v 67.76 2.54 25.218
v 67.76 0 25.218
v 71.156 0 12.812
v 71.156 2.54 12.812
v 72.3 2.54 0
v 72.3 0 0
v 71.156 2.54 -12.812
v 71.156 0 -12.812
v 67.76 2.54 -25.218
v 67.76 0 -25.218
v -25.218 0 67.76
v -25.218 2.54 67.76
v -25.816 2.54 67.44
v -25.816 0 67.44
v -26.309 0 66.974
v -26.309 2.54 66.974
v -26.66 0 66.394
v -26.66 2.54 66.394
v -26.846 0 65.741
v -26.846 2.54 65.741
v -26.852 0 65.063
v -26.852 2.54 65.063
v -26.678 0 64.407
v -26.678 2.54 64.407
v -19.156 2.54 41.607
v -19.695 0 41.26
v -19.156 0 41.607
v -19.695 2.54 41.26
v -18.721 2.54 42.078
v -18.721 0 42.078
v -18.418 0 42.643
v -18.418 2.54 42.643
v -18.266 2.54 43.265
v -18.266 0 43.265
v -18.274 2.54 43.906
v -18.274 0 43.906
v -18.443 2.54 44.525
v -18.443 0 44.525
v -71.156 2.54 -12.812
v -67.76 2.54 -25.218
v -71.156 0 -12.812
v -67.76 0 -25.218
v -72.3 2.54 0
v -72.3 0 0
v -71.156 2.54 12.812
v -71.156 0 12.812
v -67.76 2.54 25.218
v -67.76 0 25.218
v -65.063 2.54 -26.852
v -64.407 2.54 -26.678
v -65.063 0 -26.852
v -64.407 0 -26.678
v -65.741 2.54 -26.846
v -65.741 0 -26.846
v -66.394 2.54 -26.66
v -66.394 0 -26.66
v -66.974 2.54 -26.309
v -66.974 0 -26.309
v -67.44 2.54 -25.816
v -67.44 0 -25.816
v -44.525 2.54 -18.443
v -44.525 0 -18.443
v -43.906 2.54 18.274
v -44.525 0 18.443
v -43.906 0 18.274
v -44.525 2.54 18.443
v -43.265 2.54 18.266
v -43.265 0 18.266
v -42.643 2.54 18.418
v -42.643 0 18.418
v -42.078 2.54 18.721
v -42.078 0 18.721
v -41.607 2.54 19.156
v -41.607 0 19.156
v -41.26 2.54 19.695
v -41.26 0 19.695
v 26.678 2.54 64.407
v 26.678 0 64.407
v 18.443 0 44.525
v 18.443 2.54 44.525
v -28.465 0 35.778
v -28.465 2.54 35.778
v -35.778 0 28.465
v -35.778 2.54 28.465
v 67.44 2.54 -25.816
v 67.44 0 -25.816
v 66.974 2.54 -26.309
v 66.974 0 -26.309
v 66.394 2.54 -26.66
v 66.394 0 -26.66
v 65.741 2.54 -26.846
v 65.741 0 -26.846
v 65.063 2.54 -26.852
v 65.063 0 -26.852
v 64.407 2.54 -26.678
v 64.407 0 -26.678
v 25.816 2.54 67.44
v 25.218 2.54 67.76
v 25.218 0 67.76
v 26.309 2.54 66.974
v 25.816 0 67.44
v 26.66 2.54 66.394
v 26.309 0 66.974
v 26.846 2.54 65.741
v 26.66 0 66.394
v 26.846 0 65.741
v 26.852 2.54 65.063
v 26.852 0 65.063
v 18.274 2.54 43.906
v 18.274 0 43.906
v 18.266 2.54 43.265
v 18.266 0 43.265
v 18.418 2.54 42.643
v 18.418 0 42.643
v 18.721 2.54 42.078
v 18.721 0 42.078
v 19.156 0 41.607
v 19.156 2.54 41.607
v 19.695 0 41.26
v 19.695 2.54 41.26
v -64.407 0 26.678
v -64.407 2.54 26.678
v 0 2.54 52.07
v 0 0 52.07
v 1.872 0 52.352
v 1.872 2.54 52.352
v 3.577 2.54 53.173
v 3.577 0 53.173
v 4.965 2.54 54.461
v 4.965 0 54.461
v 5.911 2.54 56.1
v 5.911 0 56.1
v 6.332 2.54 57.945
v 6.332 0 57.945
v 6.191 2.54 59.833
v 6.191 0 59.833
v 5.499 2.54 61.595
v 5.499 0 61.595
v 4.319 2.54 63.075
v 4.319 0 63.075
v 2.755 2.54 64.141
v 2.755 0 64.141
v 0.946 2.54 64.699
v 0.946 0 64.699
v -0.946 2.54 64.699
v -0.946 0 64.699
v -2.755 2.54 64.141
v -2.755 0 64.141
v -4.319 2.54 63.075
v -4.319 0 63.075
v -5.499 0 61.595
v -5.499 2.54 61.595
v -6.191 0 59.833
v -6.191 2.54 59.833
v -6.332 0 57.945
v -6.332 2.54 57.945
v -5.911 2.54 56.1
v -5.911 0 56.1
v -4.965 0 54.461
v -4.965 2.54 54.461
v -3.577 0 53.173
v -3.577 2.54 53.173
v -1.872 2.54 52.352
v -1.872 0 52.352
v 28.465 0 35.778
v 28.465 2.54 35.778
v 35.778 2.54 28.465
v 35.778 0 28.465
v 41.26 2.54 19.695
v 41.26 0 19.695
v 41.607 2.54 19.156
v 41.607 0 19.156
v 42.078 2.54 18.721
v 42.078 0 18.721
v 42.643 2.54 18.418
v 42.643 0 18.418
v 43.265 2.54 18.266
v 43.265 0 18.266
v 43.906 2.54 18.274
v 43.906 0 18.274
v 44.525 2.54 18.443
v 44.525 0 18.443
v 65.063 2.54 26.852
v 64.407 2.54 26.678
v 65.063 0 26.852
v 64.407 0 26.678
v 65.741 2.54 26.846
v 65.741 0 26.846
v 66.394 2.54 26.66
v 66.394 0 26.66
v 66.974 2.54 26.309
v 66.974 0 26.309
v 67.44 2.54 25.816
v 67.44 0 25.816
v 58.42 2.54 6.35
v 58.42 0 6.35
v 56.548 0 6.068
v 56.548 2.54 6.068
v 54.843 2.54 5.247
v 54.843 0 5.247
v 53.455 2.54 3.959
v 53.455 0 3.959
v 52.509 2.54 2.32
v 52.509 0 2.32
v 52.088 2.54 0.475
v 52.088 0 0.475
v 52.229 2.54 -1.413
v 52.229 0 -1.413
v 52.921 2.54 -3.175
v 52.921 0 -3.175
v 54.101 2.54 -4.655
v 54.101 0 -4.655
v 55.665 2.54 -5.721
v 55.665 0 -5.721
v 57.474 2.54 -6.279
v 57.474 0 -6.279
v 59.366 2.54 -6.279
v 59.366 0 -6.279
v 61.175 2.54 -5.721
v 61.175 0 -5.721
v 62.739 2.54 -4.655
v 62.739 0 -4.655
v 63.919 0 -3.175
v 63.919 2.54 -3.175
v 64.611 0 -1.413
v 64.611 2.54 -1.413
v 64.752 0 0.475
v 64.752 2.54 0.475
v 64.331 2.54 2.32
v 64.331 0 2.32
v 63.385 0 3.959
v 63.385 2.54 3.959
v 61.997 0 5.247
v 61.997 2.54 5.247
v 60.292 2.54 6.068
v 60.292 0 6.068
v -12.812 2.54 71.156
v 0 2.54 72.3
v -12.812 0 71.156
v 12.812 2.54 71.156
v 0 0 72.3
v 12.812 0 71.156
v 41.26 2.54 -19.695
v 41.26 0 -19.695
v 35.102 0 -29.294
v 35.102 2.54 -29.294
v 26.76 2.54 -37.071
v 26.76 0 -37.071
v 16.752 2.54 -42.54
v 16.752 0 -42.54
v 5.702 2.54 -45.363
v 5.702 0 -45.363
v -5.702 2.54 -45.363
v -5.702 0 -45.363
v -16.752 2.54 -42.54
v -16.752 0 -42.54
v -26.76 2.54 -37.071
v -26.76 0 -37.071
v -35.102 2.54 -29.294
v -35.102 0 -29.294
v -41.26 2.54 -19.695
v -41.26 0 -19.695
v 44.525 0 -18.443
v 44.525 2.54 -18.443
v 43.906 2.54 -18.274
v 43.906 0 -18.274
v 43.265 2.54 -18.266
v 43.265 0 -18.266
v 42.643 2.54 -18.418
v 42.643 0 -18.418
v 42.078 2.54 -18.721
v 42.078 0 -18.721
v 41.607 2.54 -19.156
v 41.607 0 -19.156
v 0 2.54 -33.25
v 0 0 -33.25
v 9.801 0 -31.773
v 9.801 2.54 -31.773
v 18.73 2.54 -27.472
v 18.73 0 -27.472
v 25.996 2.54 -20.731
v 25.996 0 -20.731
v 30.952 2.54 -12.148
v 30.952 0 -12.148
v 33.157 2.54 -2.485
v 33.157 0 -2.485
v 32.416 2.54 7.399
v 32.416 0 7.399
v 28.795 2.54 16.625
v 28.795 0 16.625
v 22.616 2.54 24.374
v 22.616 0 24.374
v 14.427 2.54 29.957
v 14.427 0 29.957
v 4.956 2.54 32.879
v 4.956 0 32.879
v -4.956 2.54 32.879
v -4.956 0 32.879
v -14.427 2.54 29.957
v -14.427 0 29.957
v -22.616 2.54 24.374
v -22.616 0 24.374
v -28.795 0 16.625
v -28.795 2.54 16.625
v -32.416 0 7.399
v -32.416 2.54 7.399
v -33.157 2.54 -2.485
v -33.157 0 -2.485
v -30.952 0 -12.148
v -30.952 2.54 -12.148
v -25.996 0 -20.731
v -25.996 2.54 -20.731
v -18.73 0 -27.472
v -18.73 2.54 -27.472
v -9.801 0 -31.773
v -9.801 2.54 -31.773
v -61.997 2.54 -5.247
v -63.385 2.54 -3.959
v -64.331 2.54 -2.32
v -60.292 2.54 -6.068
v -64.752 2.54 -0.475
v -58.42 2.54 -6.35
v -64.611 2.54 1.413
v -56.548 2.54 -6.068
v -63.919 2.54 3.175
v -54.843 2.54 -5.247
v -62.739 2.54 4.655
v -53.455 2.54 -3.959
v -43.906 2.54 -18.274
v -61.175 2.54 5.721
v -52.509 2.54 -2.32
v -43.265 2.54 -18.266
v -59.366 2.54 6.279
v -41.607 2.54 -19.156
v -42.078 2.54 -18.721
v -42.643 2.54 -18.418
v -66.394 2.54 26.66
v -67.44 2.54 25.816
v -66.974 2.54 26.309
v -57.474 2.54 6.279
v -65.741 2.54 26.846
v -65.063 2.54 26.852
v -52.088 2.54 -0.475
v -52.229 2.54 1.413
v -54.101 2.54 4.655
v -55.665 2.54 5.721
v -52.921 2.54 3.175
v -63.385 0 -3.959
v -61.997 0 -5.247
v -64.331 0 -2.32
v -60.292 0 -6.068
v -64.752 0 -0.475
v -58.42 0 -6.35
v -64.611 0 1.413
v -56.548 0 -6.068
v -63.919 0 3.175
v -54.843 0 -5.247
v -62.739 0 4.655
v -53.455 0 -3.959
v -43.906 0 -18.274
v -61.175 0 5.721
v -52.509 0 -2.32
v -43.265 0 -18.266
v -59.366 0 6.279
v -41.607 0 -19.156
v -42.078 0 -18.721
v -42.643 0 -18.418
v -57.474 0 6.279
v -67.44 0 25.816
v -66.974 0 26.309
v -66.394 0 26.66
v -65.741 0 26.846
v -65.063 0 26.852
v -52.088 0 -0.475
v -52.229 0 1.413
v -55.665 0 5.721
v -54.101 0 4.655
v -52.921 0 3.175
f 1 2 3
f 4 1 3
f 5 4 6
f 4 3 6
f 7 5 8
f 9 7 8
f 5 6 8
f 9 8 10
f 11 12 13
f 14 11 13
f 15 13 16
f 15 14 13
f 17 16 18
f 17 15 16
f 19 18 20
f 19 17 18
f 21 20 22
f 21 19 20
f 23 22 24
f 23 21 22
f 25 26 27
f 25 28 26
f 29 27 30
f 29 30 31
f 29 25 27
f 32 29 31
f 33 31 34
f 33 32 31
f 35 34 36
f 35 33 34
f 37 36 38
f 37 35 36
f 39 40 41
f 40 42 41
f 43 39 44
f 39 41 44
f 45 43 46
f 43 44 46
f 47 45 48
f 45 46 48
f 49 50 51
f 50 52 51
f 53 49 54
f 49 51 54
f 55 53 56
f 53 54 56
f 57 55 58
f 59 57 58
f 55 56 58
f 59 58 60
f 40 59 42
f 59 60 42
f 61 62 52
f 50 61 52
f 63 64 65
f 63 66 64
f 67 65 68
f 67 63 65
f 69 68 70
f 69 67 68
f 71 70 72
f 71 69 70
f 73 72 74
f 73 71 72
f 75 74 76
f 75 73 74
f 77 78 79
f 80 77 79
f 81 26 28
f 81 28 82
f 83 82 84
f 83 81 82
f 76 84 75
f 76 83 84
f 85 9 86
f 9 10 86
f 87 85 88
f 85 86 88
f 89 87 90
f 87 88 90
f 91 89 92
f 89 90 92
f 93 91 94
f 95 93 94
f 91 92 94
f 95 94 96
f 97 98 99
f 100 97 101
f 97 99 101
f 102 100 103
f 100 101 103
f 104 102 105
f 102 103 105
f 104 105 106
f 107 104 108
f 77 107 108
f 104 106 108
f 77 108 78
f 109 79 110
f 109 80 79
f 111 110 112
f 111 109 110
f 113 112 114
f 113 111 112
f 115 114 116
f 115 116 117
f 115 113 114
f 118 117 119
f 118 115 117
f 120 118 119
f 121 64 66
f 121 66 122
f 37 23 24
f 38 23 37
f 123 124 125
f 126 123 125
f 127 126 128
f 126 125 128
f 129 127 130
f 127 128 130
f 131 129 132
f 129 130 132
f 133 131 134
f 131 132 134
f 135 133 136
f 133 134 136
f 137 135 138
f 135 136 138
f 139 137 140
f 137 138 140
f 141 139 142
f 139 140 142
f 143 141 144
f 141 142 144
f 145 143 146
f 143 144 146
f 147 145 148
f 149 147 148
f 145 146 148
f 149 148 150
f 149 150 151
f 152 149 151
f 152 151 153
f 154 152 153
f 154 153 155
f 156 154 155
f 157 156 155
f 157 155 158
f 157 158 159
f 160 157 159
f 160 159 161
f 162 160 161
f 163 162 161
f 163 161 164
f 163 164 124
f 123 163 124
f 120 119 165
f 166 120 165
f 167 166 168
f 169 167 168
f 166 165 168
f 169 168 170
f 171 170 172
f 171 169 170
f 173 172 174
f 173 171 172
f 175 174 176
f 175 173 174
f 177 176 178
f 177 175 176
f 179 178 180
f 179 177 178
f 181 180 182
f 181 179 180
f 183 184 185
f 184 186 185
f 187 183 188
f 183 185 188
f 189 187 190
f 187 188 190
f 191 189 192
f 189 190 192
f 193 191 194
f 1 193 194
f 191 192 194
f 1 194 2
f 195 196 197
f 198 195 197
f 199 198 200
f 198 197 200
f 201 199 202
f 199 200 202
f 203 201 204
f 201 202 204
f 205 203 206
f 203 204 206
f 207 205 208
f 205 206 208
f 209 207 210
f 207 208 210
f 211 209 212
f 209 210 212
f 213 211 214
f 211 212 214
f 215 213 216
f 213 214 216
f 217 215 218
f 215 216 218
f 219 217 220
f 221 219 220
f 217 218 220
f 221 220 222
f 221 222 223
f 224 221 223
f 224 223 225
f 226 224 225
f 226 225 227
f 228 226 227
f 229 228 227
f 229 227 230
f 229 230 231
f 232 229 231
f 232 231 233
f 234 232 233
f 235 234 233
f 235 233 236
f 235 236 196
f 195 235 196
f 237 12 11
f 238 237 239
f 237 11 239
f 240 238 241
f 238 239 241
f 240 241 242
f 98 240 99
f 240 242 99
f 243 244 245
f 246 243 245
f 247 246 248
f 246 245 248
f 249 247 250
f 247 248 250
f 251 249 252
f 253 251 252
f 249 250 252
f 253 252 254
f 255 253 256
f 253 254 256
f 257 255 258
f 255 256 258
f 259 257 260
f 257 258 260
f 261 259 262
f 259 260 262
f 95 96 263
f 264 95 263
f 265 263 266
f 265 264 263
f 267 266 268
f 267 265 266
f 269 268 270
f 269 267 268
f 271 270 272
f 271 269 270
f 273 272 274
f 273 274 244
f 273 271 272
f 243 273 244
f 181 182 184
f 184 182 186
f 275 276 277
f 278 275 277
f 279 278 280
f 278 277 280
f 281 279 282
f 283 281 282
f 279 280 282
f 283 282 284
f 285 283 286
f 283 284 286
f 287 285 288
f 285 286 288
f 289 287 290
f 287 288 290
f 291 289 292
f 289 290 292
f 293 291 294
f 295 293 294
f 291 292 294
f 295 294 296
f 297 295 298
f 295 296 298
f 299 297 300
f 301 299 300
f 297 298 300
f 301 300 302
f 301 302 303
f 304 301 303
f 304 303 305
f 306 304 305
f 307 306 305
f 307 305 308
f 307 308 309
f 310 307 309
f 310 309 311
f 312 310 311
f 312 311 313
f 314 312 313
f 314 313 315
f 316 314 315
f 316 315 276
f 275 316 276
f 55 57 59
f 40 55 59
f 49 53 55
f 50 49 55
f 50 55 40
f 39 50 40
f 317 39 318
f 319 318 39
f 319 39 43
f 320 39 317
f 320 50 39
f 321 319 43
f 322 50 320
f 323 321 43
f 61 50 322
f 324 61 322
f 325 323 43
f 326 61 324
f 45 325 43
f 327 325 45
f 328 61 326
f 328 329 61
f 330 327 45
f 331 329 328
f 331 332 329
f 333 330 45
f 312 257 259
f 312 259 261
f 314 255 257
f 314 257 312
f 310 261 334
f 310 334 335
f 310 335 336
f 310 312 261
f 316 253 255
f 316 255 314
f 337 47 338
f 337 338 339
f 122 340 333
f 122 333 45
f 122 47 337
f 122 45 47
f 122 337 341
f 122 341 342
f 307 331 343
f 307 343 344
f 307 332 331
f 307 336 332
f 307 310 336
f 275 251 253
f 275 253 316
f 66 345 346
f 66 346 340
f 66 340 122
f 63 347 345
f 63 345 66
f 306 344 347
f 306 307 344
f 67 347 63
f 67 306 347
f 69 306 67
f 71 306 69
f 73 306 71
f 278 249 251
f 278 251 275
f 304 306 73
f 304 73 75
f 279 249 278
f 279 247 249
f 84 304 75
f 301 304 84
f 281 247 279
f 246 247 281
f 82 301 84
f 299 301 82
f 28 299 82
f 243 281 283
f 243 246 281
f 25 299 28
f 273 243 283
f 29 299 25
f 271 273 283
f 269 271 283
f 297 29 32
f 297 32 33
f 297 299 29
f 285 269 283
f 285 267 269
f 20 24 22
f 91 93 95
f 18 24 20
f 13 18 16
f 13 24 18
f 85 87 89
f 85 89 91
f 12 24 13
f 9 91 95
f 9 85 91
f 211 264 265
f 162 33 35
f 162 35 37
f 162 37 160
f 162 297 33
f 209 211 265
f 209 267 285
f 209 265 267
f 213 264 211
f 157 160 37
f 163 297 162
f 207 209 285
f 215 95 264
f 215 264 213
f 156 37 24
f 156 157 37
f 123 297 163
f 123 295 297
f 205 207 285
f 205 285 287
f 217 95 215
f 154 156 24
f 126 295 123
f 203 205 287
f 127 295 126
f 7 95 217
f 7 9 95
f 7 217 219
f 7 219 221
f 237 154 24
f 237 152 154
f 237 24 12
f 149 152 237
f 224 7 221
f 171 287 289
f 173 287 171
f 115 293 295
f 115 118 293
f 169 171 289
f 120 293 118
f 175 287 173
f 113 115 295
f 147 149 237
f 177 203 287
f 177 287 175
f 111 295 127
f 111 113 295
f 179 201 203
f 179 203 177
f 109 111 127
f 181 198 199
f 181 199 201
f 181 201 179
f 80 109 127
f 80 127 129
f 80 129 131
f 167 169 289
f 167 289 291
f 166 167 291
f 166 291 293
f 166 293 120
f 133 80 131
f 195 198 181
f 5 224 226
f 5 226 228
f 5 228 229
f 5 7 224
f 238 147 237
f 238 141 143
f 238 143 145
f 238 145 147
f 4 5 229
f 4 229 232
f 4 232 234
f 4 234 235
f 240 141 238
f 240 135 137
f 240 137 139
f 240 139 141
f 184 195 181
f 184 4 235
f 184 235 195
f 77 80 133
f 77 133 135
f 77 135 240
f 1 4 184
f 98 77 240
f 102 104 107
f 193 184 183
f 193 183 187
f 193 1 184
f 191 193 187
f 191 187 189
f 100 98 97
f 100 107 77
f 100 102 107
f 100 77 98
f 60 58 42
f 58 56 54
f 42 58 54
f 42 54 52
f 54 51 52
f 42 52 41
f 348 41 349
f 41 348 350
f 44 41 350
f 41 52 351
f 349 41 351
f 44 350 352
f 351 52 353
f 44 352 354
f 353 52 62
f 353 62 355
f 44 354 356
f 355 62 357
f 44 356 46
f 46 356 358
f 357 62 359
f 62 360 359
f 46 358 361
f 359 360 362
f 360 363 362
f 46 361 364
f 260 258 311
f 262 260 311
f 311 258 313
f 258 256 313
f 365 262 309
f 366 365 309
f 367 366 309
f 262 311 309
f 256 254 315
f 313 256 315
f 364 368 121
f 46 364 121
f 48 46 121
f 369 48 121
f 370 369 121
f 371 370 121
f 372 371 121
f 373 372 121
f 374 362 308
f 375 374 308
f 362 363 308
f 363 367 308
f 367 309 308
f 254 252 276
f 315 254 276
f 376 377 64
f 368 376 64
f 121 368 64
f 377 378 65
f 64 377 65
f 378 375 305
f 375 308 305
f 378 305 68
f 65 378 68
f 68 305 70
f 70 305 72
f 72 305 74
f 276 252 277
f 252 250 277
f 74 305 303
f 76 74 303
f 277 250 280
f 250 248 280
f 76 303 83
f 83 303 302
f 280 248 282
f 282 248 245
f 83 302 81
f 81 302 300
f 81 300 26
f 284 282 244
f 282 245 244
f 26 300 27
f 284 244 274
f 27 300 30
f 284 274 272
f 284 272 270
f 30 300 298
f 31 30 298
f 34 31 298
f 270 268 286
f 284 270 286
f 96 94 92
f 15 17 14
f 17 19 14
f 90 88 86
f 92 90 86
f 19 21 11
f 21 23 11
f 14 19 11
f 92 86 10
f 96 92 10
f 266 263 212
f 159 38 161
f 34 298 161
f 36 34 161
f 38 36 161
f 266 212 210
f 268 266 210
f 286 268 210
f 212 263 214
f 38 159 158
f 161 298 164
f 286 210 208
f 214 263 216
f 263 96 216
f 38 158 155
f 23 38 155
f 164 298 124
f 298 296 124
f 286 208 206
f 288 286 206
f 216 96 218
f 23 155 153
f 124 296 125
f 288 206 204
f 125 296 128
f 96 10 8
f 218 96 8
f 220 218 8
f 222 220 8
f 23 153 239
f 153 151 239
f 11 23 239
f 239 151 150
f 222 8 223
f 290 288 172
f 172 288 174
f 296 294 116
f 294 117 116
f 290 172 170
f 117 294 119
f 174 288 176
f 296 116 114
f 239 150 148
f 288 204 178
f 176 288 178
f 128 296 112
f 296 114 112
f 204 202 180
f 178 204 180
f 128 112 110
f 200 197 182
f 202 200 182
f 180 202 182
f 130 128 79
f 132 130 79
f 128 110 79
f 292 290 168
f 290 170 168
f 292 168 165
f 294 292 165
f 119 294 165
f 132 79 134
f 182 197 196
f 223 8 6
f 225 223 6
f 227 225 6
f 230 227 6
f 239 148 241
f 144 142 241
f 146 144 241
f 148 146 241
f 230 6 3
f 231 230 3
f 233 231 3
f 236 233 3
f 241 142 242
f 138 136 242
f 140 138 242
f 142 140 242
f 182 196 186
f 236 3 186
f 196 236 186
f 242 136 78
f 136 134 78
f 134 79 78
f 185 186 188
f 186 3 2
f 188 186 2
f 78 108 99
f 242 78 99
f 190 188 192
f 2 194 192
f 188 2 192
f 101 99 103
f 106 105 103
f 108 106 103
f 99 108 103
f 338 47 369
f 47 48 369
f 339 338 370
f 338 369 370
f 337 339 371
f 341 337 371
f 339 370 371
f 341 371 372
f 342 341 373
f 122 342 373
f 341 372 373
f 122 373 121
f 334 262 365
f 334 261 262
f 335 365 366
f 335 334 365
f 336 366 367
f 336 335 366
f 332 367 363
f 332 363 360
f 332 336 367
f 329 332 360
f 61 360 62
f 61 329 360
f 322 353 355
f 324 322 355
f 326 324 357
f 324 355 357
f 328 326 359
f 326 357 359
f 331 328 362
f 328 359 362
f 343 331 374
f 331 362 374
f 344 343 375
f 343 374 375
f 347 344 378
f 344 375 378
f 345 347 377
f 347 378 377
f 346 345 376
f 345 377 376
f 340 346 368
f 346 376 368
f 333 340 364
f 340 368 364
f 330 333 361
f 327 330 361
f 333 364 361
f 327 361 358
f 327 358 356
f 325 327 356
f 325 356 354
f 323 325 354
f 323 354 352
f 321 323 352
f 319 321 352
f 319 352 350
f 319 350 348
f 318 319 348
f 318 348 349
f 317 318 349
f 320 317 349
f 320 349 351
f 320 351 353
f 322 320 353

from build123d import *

# Parameters (mm, degrees)
SKETCH1_R      = 72.3
EXTRUDE1_DEPTH = 2.54
SKETCH2_R      = 6.35
EXTRUDE2_DEPTH = 103.279184588
SKETCH3_R      = 33.25
EXTRUDE3_DEPTH = 103.279184588
EXTRUDE4_DEPTH = 2.54
FILLET1_R      = 2.54


with BuildPart() as part:
    # Sketch1 → Extrude1 (new body)
    with BuildSketch(Plane(origin=(0, 0, 0), x_dir=(1, 0, 0), z_dir=(0, 1, 0))):
        with Locations(Location((0, 0, 0), (0, 0, 270))):
            Circle(SKETCH1_R)
    extrude(amount=EXTRUDE1_DEPTH)

    # Sketch2 → Extrude2 (cut, through all)
    with BuildSketch(Plane.XZ):
        with Locations(Location((-58.42, 0, 0), (0, 0, 270))):
            Circle(SKETCH2_R)
        with Locations(Location((58.42, 0, 0), (0, 0, 90))):
            Circle(SKETCH2_R)
        with Locations(Location((0, 58.42, 0), (0, 0, 270))):
            Circle(SKETCH2_R)
    extrude(amount=-EXTRUDE2_DEPTH, mode=Mode.SUBTRACT)

    # Sketch3 → Extrude3 (cut, through all)
    with BuildSketch(Plane.XZ):
        with Locations(Location((0, 0, 0), (0, 0, 270))):
            Circle(SKETCH3_R)
    extrude(amount=-EXTRUDE3_DEPTH, mode=Mode.SUBTRACT)

    # Sketch4 → Extrude4 (cut)
    with BuildSketch(Plane.XZ):
        with BuildLine():
            Line((-42.239772226, -17.496286528), (-196.027114776, -81.197089533))
            Line((-196.027114776, -81.197089533), (196.027114776, -81.197089533))
            Line((196.027114776, -81.197089533), (42.239772226, -17.496286528))
            ThreePointArc((42.239772226, -17.496286528), (0, -45.72), (-42.239772226, -17.496286528))
        make_face()
        with BuildLine():
            Line((-42.239772226, 17.496286528), (-90.262778901, 37.388067198))
            Line((-90.262778901, 37.388067198), (-35.092483391, 84.720749339))
            Line((-35.092483391, 84.720749339), (-17.496286528, 42.239772226))
            ThreePointArc((-17.496286528, 42.239772226), (-32.328922036, 32.328922036), (-42.239772226, 17.496286528))
        make_face()
        with BuildLine():
            Line((42.239772226, 17.496286528), (90.262778901, 37.388067198))
            Line((90.262778901, 37.388067198), (35.092483391, 84.720749339))
            Line((35.092483391, 84.720749339), (17.496286528, 42.239772226))
            ThreePointArc((17.496286528, 42.239772226), (32.328922036, 32.328922036), (42.239772226, 17.496286528))
        make_face()
    extrude(amount=-EXTRUDE4_DEPTH, mode=Mode.SUBTRACT)

    # Fillet1
    fillet1_edges = [part.edges().sort_by_distance(p)[0] for p in [
        (66.796490201, 1.27, -27.66801216),
        (42.239772226, 1.27, -17.496286528),
        (-66.796490201, 1.27, -27.66801216),
        (-42.239772226, 1.27, -17.496286528),
        (-66.796490201, 1.27, 27.66801216),
        (-42.239772226, 1.27, 17.496286528),
        (-27.66801216, 1.27, 66.796490201),
        (-17.496286528, 1.27, 42.239772226),
        (27.66801216, 1.27, 66.796490201),
        (17.496286528, 1.27, 42.239772226),
        (66.796490201, 1.27, 27.66801216),
        (42.239772226, 1.27, 17.496286528),
    ]]
    fillet(fillet1_edges, radius=FILLET1_R)


solid = part.part
